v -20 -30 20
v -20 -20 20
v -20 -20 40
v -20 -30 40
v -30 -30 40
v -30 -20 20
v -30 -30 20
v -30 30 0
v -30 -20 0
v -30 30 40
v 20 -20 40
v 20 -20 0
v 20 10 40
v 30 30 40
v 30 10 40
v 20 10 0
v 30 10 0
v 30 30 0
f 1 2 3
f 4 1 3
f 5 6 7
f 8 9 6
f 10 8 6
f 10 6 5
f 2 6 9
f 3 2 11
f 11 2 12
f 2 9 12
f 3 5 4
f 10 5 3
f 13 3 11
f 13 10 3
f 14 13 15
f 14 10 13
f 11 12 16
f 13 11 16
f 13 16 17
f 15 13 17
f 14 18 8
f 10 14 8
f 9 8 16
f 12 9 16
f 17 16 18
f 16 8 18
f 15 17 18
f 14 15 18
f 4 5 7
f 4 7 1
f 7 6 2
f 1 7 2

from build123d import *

# Parameters (mm, degrees)
F1_DEPTH = 40
F2_W     = 10
F2_H     = 20
F3_DEPTH = 10


with BuildPart() as f1:
    # F0 (on Top) → F1 (new body)
    with BuildSketch(Plane.XY):
        Polygon((30, 10), (30, 30), (-30, 30), (-30, -20), (20, -20), (20, 10), align=None)
    extrude(amount=F1_DEPTH)

    # F2 (on face) → F3 (join)
    with BuildSketch(Plane.XZ.offset(20)):
        with Locations((-25, 30)):
            Rectangle(F2_W, F2_H)
    extrude(amount=F3_DEPTH)


solid = f1.part
